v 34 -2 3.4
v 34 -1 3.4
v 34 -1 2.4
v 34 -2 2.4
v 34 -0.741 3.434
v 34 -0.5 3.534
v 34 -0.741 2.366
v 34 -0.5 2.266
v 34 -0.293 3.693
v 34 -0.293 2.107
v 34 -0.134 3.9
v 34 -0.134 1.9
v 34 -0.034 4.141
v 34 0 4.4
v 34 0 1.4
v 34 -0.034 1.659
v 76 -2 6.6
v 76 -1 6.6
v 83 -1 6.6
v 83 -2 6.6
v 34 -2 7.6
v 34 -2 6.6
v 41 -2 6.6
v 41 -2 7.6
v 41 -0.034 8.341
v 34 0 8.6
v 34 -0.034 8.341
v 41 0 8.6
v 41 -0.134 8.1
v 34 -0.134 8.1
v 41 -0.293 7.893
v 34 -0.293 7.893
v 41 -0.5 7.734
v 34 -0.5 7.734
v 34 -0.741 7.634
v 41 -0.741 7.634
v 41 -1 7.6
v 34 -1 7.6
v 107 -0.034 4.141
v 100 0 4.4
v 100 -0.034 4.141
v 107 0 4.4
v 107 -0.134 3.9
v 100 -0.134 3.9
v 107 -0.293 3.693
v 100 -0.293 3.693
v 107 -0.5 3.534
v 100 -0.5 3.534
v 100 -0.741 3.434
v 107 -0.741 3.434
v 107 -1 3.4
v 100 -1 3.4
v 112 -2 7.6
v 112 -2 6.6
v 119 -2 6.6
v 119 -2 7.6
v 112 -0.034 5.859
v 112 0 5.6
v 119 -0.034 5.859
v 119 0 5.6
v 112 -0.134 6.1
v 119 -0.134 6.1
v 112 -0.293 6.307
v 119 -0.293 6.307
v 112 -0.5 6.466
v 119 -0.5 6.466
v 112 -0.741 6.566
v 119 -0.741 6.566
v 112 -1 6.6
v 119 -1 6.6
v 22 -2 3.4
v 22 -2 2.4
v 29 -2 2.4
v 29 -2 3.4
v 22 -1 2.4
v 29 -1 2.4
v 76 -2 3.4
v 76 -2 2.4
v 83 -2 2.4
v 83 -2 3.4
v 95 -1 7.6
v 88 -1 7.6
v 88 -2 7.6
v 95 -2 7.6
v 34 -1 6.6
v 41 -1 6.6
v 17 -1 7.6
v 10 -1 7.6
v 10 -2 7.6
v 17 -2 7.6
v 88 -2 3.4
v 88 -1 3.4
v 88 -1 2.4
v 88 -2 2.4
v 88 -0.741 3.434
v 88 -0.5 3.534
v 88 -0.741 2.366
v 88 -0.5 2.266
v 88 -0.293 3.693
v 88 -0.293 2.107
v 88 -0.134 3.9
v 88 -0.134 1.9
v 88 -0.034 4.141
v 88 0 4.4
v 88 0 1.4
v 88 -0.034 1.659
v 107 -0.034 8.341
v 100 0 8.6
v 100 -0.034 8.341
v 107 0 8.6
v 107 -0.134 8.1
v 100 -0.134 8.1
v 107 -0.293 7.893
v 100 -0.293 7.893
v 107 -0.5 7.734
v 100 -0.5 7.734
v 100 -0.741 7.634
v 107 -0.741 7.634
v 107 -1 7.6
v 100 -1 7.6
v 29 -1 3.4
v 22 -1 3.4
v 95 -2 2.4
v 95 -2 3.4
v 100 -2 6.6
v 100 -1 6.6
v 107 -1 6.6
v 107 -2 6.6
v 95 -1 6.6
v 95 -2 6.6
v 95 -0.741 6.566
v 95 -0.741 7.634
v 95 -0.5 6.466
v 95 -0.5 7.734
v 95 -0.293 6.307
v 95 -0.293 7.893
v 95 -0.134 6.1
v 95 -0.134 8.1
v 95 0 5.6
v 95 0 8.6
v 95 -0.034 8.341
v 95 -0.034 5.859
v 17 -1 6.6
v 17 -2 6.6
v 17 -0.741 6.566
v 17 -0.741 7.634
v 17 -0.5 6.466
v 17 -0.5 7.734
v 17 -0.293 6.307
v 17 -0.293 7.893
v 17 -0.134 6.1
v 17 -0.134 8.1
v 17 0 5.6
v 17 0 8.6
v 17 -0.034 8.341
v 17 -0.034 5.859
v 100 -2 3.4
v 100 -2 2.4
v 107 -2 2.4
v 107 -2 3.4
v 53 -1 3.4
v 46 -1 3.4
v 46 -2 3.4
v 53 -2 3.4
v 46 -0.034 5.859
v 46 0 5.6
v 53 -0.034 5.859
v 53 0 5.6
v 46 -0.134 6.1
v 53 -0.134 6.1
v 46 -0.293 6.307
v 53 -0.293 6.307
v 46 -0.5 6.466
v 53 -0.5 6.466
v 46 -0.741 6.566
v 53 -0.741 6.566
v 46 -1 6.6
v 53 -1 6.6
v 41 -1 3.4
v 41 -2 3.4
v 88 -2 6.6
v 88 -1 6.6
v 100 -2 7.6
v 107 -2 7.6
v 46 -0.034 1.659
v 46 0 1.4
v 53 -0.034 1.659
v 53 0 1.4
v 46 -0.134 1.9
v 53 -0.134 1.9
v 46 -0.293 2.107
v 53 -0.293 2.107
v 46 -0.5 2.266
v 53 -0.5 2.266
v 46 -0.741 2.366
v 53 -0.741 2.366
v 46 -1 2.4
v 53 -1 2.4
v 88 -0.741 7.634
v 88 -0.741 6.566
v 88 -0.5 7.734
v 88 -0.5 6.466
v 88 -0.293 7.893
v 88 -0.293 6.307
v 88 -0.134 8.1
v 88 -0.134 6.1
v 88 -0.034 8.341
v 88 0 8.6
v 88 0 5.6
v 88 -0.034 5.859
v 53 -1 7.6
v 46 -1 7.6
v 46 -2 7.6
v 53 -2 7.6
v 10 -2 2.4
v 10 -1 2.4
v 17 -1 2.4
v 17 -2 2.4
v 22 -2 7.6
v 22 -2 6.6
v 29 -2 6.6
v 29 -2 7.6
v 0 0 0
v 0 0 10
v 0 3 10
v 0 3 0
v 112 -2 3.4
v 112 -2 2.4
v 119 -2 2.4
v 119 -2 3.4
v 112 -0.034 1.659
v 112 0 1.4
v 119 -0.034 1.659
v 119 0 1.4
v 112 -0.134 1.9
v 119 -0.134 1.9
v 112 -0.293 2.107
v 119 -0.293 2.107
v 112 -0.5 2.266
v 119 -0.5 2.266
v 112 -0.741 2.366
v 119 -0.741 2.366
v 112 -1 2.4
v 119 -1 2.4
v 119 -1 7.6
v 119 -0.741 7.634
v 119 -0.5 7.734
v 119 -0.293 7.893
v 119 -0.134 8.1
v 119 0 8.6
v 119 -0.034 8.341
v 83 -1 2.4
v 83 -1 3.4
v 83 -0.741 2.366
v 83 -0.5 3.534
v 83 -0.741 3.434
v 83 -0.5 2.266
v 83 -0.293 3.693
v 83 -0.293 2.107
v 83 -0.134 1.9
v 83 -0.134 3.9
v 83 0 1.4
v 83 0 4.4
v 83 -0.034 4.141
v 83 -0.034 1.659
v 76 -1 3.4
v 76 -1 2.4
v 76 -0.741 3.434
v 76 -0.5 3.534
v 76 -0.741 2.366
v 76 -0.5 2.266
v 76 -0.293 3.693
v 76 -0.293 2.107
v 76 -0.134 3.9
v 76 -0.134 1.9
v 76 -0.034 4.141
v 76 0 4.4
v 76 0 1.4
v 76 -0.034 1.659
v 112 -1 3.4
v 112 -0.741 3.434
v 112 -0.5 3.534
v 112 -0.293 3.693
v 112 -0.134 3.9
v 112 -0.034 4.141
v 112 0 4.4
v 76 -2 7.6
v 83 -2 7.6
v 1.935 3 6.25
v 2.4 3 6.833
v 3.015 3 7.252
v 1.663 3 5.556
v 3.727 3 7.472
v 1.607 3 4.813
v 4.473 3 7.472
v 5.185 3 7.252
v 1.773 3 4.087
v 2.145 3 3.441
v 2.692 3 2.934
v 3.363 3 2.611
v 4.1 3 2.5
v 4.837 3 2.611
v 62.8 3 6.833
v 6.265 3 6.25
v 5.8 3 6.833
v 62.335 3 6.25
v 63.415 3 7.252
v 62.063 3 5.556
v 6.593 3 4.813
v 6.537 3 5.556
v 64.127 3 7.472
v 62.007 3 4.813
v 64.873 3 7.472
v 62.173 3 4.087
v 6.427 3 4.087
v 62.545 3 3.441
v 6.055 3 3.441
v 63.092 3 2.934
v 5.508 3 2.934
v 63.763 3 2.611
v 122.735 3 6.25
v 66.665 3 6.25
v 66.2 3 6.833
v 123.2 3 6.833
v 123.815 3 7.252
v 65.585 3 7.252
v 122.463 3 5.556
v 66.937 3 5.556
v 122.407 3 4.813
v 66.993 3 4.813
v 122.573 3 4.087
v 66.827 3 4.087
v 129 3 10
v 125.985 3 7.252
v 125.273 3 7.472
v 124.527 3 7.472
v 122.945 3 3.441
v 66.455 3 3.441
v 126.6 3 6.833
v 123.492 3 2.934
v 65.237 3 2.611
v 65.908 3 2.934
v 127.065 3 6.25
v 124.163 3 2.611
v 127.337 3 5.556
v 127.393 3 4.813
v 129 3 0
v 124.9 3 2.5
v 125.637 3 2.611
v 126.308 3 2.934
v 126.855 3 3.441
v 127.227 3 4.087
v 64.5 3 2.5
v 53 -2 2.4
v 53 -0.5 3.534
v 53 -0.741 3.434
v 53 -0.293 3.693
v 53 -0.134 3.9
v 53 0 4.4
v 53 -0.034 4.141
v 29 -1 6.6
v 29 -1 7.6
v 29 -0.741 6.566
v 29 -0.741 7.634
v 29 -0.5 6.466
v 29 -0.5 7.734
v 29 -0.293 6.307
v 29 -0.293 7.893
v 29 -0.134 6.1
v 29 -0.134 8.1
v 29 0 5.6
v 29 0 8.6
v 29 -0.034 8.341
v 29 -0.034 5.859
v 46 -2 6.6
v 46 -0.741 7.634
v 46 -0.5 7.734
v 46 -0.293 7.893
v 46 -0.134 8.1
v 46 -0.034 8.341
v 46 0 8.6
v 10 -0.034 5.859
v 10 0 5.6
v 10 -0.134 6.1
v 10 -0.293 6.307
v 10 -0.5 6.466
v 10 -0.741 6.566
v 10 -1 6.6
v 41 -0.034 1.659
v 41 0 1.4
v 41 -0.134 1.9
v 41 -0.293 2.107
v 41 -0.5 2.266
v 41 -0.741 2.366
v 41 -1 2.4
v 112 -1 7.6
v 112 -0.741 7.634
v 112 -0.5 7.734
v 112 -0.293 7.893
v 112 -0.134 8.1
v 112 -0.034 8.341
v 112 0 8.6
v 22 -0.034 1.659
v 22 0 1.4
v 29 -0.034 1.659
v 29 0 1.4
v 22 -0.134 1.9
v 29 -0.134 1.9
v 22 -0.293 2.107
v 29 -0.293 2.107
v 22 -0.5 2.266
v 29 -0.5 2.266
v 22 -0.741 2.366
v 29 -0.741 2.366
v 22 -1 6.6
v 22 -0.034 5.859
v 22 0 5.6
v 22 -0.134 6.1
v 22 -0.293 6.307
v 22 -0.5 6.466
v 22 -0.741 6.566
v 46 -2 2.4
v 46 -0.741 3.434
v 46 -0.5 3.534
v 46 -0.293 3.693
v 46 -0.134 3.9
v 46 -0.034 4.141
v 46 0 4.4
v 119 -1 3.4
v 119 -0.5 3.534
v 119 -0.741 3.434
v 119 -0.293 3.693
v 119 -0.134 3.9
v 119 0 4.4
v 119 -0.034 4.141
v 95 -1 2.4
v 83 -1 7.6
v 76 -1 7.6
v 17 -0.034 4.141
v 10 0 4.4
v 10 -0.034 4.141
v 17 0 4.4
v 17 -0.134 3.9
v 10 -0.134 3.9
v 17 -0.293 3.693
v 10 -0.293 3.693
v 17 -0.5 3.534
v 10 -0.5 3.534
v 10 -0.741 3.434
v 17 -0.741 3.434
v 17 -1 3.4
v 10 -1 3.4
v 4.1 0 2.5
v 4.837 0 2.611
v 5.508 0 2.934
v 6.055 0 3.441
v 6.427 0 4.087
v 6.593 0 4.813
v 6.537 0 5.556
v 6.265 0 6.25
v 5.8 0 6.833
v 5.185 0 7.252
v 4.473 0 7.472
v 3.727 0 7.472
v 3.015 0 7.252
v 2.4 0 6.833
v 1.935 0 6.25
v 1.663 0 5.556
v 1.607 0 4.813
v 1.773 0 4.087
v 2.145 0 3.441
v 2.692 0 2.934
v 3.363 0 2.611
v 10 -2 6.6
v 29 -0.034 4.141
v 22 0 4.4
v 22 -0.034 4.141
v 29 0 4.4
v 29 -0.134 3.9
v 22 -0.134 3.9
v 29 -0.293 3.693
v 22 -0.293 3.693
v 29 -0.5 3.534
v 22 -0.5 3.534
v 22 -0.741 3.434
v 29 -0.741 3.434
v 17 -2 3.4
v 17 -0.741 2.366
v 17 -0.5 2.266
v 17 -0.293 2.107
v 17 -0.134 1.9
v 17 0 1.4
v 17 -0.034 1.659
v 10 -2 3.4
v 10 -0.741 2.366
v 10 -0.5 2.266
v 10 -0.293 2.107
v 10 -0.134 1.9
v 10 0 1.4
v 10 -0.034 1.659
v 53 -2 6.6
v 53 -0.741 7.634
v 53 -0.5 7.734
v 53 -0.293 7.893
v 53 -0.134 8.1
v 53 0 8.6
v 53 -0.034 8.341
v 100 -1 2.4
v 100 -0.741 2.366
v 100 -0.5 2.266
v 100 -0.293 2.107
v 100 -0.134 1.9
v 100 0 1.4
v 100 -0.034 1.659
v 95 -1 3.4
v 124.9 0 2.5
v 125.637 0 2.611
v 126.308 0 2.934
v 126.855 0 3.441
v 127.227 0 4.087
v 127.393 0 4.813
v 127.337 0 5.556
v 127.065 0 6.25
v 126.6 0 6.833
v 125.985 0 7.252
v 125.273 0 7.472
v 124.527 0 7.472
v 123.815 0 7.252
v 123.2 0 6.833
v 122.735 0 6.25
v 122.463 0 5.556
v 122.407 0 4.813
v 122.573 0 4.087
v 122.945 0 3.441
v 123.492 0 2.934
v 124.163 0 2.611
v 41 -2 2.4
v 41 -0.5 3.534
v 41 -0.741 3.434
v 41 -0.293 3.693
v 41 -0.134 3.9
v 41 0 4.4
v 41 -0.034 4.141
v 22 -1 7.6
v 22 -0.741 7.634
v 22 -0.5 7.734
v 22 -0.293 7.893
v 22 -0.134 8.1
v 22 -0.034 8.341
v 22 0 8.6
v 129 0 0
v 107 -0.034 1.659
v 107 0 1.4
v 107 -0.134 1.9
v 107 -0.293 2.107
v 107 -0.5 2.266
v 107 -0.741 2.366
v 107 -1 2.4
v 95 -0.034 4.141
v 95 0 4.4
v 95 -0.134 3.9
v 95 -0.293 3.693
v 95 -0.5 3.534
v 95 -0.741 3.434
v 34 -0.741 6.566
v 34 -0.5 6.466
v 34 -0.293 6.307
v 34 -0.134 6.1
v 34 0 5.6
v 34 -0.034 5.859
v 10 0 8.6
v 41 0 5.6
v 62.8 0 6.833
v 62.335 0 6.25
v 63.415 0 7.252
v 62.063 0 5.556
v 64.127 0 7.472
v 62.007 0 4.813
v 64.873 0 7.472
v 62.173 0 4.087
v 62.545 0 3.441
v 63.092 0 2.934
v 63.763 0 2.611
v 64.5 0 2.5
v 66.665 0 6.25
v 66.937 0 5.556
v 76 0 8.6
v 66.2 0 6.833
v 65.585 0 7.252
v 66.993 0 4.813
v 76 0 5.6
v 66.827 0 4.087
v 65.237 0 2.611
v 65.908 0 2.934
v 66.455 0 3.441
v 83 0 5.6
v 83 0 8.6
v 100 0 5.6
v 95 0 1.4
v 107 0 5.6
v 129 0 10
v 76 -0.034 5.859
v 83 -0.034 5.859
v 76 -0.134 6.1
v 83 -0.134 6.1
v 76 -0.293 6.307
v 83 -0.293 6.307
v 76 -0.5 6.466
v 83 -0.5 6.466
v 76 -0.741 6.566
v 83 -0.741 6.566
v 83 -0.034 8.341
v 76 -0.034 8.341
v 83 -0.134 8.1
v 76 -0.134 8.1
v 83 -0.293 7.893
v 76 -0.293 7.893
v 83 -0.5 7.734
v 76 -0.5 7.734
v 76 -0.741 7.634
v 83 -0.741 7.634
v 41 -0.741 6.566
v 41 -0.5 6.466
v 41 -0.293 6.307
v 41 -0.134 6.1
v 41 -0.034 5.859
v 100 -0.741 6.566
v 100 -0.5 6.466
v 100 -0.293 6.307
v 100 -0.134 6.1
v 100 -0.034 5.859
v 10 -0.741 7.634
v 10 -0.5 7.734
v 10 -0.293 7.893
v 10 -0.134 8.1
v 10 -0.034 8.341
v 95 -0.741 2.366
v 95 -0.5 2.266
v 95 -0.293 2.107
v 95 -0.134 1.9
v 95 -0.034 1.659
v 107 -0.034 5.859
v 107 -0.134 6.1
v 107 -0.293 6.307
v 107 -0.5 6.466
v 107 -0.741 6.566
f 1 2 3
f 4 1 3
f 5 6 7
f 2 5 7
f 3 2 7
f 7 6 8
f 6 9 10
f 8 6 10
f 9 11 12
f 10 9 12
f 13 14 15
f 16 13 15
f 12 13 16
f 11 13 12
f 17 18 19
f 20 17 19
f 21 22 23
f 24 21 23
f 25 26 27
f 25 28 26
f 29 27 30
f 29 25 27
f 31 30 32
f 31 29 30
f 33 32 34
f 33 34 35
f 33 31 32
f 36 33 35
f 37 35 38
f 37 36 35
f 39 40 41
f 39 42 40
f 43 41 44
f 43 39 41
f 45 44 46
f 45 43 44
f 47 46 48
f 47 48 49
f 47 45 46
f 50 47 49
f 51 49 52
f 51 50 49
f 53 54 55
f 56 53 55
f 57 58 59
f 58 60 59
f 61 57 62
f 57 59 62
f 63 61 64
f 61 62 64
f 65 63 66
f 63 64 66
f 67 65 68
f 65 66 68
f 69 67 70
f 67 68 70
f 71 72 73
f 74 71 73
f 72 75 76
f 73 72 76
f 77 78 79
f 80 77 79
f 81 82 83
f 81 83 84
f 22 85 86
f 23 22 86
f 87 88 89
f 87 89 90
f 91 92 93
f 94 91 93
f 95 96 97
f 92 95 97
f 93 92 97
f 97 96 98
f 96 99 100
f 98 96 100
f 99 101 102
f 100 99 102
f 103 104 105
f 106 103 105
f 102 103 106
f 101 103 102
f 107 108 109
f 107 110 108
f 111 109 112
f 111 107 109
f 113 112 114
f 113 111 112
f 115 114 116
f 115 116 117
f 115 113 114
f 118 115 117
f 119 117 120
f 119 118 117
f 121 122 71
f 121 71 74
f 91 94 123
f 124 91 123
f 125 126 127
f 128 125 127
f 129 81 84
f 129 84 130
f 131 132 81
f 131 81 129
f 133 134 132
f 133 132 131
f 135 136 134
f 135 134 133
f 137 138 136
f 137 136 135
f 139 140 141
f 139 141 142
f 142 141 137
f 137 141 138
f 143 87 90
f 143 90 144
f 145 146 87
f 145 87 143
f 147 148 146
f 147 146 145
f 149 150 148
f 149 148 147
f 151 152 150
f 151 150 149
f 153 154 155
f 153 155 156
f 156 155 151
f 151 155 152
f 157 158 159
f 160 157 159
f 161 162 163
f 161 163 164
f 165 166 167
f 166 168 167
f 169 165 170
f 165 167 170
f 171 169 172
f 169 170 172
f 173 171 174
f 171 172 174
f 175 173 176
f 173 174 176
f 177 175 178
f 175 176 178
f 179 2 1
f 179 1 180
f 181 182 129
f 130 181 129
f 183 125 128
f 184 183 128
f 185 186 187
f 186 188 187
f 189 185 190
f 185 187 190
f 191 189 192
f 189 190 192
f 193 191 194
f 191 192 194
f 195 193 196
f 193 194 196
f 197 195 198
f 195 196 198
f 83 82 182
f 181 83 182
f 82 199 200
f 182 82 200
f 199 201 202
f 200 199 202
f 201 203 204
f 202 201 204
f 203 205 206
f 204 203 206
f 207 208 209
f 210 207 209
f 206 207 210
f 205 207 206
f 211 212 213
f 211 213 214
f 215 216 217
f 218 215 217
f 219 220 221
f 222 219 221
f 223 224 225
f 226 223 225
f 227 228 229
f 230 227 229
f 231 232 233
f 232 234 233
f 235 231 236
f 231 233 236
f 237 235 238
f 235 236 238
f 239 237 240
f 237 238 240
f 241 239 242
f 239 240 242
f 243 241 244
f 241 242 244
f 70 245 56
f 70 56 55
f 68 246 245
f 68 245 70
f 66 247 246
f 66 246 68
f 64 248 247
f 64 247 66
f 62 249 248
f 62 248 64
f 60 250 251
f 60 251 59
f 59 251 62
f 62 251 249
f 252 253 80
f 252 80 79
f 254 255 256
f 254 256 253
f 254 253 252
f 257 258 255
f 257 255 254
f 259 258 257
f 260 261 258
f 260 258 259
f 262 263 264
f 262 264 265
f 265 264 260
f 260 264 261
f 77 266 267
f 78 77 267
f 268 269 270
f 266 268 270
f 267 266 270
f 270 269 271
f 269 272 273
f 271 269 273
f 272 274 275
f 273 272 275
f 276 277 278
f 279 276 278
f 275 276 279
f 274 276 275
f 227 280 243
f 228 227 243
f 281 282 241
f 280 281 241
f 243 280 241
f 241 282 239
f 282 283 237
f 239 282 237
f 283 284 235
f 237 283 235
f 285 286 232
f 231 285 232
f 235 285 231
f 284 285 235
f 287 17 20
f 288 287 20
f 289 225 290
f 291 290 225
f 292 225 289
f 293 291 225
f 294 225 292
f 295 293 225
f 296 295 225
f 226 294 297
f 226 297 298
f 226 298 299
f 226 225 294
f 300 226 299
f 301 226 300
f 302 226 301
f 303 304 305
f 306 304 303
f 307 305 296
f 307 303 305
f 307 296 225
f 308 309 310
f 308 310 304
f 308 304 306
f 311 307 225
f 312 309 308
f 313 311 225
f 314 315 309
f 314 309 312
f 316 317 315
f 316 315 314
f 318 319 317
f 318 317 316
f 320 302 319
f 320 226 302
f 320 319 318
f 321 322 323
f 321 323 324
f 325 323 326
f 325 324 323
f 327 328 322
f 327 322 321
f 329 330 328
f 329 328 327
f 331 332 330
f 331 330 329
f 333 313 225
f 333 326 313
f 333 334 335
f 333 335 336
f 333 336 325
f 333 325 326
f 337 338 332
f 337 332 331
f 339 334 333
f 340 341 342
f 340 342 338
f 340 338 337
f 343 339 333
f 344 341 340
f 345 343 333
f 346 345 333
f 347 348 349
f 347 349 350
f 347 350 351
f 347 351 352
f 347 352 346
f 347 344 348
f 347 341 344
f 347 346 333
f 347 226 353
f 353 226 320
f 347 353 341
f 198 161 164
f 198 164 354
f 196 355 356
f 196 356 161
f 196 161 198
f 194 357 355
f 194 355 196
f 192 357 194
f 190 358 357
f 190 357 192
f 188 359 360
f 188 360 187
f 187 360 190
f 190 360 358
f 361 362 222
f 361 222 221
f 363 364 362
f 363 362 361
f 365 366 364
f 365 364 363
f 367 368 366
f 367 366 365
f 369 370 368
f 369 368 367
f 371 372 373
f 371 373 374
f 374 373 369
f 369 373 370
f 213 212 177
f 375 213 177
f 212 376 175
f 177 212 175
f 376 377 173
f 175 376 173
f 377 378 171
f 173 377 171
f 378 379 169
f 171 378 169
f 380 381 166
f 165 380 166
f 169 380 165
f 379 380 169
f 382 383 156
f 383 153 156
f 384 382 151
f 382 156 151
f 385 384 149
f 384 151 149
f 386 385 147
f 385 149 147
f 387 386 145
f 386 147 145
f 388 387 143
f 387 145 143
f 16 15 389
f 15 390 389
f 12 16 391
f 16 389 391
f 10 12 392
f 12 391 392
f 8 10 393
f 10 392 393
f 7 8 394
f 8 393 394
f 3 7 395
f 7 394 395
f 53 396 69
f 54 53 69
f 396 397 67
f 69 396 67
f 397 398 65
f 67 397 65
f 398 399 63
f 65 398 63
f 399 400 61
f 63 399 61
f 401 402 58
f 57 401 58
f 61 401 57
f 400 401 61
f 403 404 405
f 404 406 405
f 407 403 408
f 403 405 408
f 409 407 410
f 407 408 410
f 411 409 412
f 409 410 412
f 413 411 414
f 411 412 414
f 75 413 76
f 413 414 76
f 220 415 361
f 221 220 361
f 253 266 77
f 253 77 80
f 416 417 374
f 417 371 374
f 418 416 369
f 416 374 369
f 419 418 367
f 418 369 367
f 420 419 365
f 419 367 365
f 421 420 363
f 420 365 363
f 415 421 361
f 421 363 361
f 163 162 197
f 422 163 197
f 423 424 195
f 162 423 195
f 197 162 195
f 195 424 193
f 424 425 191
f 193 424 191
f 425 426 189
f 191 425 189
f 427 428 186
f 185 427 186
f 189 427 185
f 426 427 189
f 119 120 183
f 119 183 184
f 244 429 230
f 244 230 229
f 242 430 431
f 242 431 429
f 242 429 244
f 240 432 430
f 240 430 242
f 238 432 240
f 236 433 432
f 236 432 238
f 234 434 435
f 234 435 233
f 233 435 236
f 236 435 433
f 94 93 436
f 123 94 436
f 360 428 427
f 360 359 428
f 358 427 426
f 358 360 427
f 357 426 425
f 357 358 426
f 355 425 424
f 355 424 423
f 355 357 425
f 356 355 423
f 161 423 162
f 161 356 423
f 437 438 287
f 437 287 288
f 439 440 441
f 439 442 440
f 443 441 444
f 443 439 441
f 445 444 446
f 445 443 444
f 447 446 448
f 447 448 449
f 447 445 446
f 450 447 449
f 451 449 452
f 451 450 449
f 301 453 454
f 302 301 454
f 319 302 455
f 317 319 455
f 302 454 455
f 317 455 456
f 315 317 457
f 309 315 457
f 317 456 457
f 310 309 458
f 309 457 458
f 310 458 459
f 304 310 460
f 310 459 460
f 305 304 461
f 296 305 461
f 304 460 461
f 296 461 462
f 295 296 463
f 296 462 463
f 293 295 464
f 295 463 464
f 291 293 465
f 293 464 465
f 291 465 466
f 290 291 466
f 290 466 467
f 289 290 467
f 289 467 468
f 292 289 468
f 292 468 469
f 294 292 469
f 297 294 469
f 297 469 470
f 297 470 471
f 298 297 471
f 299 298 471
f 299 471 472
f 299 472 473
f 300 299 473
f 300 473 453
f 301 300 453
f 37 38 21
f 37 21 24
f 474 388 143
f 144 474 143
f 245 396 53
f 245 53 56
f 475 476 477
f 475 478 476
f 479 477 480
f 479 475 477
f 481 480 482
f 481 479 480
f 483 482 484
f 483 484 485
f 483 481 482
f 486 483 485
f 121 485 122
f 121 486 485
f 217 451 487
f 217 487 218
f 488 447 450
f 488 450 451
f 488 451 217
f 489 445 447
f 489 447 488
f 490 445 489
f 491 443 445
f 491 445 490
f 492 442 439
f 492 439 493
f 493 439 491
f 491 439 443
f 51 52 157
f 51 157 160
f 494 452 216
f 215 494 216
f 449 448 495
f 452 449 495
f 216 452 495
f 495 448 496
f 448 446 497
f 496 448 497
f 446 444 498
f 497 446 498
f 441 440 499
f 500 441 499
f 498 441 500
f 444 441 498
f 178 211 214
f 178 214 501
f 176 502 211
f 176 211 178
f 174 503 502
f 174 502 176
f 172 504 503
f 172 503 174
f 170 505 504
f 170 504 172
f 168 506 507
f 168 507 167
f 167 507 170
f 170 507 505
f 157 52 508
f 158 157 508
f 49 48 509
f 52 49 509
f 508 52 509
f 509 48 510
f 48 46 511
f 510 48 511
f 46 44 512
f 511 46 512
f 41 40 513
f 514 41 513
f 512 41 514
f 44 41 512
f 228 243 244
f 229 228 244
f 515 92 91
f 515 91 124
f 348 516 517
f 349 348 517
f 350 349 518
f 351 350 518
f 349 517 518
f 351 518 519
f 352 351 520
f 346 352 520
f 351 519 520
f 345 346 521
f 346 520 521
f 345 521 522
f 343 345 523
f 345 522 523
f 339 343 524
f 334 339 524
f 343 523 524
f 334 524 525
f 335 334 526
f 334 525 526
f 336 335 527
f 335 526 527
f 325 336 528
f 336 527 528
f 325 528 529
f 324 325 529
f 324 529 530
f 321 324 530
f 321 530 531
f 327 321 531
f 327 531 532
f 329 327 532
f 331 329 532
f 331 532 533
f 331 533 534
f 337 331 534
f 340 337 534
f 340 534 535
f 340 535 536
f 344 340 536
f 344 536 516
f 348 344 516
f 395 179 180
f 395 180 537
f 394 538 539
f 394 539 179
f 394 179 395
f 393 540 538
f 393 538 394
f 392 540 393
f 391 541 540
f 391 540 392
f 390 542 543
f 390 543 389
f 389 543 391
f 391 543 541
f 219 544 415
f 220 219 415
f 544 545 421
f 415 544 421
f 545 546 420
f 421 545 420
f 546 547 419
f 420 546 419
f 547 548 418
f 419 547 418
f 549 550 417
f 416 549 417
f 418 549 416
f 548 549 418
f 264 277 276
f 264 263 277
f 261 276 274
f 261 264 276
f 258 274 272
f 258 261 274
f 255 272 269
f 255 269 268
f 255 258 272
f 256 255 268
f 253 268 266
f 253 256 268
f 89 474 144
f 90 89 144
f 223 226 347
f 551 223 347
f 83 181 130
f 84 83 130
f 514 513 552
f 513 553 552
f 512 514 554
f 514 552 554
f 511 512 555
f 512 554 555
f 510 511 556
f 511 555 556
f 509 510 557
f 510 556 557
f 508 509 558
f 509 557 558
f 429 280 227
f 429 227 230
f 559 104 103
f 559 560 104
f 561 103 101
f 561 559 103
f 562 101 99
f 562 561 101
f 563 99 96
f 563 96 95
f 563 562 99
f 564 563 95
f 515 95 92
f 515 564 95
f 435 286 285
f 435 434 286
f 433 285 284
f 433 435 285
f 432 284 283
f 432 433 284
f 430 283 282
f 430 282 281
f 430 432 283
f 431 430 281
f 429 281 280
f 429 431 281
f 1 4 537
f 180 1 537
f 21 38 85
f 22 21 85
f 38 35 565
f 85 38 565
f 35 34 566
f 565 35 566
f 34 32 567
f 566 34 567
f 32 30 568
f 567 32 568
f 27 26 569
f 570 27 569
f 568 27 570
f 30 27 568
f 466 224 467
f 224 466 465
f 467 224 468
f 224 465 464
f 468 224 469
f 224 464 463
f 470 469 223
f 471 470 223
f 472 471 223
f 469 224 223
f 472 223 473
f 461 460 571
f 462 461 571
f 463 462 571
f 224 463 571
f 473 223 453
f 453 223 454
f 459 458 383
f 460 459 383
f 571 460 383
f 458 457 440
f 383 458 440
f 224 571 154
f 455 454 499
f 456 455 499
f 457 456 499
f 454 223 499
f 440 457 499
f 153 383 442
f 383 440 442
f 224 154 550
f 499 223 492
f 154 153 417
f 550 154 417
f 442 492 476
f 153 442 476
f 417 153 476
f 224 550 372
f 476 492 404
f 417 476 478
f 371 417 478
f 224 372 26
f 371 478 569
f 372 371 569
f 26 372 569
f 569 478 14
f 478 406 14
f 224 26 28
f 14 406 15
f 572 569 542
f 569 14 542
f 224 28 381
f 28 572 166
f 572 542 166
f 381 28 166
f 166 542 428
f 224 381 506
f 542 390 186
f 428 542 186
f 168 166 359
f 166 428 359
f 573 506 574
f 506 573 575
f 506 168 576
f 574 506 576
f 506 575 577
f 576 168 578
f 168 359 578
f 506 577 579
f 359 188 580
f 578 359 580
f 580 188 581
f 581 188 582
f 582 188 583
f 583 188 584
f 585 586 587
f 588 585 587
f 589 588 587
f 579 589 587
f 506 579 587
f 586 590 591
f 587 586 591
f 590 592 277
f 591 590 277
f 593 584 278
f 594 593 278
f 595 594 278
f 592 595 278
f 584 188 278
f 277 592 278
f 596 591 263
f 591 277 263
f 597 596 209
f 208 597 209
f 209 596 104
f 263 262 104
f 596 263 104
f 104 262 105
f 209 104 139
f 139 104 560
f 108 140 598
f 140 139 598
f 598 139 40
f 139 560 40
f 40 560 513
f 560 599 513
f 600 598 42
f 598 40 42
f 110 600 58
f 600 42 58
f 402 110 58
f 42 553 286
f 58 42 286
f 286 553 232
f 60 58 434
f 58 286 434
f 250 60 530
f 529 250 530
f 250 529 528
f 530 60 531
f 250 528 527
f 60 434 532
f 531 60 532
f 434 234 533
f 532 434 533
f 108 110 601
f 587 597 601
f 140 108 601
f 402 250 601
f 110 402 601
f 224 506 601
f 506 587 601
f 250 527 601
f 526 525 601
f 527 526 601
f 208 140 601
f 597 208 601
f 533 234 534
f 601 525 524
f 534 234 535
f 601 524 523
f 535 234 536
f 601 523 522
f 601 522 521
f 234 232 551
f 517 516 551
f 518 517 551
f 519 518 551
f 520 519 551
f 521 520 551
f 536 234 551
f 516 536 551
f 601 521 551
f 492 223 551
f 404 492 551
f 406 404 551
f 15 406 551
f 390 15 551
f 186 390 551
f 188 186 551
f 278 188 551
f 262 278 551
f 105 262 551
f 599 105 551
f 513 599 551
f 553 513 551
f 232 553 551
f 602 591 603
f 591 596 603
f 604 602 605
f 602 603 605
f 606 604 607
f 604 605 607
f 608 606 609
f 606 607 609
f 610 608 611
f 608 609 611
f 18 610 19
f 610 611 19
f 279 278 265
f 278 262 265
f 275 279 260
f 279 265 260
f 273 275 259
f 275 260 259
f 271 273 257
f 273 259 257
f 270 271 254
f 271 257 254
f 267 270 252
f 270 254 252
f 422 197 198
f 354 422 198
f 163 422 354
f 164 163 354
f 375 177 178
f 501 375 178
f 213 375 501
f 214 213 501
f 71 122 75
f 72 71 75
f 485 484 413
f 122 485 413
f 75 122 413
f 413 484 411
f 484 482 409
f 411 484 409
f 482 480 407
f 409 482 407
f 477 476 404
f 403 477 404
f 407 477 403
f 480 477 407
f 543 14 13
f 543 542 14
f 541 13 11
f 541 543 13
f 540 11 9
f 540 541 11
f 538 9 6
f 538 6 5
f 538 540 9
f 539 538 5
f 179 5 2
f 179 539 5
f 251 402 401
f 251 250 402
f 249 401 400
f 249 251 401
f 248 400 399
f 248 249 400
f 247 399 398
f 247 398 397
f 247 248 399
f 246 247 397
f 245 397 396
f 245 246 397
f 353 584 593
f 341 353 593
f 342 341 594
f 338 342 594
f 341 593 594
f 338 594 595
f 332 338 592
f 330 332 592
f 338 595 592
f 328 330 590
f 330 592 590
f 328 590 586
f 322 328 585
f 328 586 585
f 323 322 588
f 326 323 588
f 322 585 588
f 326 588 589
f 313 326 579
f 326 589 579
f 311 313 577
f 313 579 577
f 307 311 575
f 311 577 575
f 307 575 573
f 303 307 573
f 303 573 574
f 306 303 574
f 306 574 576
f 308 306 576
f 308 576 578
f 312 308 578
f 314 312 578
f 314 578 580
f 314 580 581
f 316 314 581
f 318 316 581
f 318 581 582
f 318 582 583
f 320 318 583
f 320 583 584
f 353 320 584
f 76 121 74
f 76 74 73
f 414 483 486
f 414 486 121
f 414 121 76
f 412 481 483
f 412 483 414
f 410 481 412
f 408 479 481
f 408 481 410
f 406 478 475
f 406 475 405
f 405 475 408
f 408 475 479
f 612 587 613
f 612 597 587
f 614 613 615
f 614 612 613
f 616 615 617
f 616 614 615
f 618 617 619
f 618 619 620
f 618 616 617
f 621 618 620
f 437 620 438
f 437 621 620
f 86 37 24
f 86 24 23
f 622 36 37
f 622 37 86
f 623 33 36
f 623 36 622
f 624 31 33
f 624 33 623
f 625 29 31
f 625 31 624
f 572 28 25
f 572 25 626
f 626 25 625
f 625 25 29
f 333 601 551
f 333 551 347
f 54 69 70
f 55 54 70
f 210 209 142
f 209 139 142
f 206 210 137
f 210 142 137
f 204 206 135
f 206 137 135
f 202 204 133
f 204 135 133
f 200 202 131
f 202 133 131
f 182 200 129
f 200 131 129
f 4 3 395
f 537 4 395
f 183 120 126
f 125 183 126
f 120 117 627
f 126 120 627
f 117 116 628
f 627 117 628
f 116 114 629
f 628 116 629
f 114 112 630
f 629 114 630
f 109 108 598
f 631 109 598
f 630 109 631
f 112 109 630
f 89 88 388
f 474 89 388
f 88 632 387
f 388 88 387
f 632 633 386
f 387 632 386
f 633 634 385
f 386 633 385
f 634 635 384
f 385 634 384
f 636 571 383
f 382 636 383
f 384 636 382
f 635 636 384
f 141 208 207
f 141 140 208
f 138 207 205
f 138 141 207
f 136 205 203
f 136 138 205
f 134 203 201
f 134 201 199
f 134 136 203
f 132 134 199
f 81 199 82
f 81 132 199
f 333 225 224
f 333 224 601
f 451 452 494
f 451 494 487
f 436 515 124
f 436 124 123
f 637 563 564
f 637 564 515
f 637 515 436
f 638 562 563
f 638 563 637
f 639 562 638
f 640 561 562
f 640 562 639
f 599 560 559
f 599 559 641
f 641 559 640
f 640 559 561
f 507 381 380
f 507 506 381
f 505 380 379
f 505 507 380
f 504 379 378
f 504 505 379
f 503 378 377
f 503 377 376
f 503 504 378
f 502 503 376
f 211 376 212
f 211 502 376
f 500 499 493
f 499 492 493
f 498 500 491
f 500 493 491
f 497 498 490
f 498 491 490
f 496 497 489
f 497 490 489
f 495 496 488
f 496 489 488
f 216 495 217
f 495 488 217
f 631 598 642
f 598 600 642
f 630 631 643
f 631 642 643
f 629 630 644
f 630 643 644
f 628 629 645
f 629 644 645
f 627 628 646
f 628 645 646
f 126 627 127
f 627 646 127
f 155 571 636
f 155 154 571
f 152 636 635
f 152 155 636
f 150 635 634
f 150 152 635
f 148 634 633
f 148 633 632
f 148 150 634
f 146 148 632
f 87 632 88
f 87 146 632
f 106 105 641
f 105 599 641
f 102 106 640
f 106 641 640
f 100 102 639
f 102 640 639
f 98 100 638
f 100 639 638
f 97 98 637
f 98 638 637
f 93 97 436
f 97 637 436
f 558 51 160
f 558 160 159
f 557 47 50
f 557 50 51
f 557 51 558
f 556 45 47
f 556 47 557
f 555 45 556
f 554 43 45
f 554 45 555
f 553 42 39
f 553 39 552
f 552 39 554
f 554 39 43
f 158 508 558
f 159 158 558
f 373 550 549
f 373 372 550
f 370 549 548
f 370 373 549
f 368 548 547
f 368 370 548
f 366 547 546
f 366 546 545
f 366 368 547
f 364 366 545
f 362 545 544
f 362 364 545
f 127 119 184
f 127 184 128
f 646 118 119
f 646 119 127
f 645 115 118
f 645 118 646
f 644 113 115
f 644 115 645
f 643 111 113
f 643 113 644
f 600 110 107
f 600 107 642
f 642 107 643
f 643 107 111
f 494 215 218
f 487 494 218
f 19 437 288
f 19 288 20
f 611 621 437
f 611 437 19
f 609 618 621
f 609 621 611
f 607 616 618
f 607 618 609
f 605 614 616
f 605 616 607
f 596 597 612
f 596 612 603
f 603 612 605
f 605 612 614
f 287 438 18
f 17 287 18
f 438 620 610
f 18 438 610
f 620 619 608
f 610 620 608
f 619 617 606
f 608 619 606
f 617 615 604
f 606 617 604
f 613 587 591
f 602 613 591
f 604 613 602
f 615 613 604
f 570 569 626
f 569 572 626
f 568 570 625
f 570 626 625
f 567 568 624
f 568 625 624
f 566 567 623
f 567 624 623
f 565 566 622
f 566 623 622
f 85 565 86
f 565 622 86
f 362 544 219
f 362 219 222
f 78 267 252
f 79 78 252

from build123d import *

# Parameters (mm, degrees)
SKETCH1_W              = 129
SKETCH1_H              = 3
BOSS_EXTRUDE1_DEPTH    = 10
SKETCH2_R              = 2.5
CUT_EXTRUDE1_DEPTH     = 4
SKETCH3_W              = 7
SKETCH3_H              = 1
BOSS_EXTRUDE2_DEPTH    = 2
FILLET1_R              = 1
LPATTERN1_COUNT        = 4
LPATTERN1_PITCH        = 12
FILLET1_OF_LPATTERN1_R = 1


with BuildPart() as part:
    # Sketch1 → Boss-Extrude1 (new body)
    with BuildSketch(Plane.XY):
        with Locations((64.5, 1.5)):
            Rectangle(SKETCH1_W, SKETCH1_H)
    extrude(amount=BOSS_EXTRUDE1_DEPTH)

    # Sketch2 → Cut-Extrude1 (cut, through all)
    with BuildSketch(Plane.XZ):
        with Locations(Location((4.1, 5, 0), (0, 0, 270))):  # turned: the seam where the file's is
            Circle(SKETCH2_R)
        with Locations(Location((64.5, 5, 0), (0, 0, 270))):  # turned: the seam where the file's is
            Circle(SKETCH2_R)
        with Locations(Location((124.9, 5, 0), (0, 0, 270))):  # turned: the seam where the file's is
            Circle(SKETCH2_R)
    extrude(amount=-CUT_EXTRUDE1_DEPTH, mode=Mode.SUBTRACT)

    # Sketch3 → Boss-Extrude2 (add)
    with BuildSketch(Plane(origin=(0, 0, 0), x_dir=(1, 0, 0), z_dir=(0, 1, 0))):
        with Locations((13.5, -2.9)):
            Rectangle(SKETCH3_W, SKETCH3_H)
        with Locations((13.5, -7.1)):
            Rectangle(SKETCH3_W, SKETCH3_H)
        with Locations((79.5, -2.9)):
            Rectangle(SKETCH3_W, SKETCH3_H)
        with Locations((79.5, -7.1)):
            Rectangle(SKETCH3_W, SKETCH3_H)
    boss_extrude2 = extrude(amount=-BOSS_EXTRUDE2_DEPTH)

    # Fillet1
    fillet1_edges = [part.edges().sort_by_distance(p)[0] for p in [
        (13.5, 0, 3.4),
        (13.5, 0, 2.4),
        (13.5, 0, 7.6),
        (13.5, 0, 6.6),
        (79.5, 0, 3.4),
        (79.5, 0, 2.4),
        (79.5, 0, 7.6),
        (79.5, 0, 6.6),
    ]]
    fillet(fillet1_edges, radius=FILLET1_R)

    # LPattern1: Boss-Extrude2 ×4
    with Locations(*[(i * LPATTERN1_PITCH, 0, 0) for i in range(1, LPATTERN1_COUNT)]):
        add(boss_extrude2)

    # Fillet1 of LPattern1
    fillet1_of_lpattern1_edges = [part.edges().sort_by_distance(p)[0] for p in [
        (25.5, 0, 3.4),
        (25.5, 0, 2.4),
        (25.5, 0, 7.6),
        (25.5, 0, 6.6),
        (91.5, 0, 3.4),
        (91.5, 0, 2.4),
        (91.5, 0, 7.6),
        (91.5, 0, 6.6),
        (37.5, 0, 3.4),
        (37.5, 0, 2.4),
        (37.5, 0, 7.6),
        (37.5, 0, 6.6),
        (103.5, 0, 3.4),
        (103.5, 0, 2.4),
        (103.5, 0, 7.6),
        (103.5, 0, 6.6),
        (49.5, 0, 3.4),
        (49.5, 0, 2.4),
        (49.5, 0, 7.6),
        (49.5, 0, 6.6),
        (115.5, 0, 3.4),
        (115.5, 0, 2.4),
        (115.5, 0, 7.6),
        (115.5, 0, 6.6),
    ]]
    fillet(fillet1_of_lpattern1_edges, radius=FILLET1_OF_LPATTERN1_R)


solid = part.part
